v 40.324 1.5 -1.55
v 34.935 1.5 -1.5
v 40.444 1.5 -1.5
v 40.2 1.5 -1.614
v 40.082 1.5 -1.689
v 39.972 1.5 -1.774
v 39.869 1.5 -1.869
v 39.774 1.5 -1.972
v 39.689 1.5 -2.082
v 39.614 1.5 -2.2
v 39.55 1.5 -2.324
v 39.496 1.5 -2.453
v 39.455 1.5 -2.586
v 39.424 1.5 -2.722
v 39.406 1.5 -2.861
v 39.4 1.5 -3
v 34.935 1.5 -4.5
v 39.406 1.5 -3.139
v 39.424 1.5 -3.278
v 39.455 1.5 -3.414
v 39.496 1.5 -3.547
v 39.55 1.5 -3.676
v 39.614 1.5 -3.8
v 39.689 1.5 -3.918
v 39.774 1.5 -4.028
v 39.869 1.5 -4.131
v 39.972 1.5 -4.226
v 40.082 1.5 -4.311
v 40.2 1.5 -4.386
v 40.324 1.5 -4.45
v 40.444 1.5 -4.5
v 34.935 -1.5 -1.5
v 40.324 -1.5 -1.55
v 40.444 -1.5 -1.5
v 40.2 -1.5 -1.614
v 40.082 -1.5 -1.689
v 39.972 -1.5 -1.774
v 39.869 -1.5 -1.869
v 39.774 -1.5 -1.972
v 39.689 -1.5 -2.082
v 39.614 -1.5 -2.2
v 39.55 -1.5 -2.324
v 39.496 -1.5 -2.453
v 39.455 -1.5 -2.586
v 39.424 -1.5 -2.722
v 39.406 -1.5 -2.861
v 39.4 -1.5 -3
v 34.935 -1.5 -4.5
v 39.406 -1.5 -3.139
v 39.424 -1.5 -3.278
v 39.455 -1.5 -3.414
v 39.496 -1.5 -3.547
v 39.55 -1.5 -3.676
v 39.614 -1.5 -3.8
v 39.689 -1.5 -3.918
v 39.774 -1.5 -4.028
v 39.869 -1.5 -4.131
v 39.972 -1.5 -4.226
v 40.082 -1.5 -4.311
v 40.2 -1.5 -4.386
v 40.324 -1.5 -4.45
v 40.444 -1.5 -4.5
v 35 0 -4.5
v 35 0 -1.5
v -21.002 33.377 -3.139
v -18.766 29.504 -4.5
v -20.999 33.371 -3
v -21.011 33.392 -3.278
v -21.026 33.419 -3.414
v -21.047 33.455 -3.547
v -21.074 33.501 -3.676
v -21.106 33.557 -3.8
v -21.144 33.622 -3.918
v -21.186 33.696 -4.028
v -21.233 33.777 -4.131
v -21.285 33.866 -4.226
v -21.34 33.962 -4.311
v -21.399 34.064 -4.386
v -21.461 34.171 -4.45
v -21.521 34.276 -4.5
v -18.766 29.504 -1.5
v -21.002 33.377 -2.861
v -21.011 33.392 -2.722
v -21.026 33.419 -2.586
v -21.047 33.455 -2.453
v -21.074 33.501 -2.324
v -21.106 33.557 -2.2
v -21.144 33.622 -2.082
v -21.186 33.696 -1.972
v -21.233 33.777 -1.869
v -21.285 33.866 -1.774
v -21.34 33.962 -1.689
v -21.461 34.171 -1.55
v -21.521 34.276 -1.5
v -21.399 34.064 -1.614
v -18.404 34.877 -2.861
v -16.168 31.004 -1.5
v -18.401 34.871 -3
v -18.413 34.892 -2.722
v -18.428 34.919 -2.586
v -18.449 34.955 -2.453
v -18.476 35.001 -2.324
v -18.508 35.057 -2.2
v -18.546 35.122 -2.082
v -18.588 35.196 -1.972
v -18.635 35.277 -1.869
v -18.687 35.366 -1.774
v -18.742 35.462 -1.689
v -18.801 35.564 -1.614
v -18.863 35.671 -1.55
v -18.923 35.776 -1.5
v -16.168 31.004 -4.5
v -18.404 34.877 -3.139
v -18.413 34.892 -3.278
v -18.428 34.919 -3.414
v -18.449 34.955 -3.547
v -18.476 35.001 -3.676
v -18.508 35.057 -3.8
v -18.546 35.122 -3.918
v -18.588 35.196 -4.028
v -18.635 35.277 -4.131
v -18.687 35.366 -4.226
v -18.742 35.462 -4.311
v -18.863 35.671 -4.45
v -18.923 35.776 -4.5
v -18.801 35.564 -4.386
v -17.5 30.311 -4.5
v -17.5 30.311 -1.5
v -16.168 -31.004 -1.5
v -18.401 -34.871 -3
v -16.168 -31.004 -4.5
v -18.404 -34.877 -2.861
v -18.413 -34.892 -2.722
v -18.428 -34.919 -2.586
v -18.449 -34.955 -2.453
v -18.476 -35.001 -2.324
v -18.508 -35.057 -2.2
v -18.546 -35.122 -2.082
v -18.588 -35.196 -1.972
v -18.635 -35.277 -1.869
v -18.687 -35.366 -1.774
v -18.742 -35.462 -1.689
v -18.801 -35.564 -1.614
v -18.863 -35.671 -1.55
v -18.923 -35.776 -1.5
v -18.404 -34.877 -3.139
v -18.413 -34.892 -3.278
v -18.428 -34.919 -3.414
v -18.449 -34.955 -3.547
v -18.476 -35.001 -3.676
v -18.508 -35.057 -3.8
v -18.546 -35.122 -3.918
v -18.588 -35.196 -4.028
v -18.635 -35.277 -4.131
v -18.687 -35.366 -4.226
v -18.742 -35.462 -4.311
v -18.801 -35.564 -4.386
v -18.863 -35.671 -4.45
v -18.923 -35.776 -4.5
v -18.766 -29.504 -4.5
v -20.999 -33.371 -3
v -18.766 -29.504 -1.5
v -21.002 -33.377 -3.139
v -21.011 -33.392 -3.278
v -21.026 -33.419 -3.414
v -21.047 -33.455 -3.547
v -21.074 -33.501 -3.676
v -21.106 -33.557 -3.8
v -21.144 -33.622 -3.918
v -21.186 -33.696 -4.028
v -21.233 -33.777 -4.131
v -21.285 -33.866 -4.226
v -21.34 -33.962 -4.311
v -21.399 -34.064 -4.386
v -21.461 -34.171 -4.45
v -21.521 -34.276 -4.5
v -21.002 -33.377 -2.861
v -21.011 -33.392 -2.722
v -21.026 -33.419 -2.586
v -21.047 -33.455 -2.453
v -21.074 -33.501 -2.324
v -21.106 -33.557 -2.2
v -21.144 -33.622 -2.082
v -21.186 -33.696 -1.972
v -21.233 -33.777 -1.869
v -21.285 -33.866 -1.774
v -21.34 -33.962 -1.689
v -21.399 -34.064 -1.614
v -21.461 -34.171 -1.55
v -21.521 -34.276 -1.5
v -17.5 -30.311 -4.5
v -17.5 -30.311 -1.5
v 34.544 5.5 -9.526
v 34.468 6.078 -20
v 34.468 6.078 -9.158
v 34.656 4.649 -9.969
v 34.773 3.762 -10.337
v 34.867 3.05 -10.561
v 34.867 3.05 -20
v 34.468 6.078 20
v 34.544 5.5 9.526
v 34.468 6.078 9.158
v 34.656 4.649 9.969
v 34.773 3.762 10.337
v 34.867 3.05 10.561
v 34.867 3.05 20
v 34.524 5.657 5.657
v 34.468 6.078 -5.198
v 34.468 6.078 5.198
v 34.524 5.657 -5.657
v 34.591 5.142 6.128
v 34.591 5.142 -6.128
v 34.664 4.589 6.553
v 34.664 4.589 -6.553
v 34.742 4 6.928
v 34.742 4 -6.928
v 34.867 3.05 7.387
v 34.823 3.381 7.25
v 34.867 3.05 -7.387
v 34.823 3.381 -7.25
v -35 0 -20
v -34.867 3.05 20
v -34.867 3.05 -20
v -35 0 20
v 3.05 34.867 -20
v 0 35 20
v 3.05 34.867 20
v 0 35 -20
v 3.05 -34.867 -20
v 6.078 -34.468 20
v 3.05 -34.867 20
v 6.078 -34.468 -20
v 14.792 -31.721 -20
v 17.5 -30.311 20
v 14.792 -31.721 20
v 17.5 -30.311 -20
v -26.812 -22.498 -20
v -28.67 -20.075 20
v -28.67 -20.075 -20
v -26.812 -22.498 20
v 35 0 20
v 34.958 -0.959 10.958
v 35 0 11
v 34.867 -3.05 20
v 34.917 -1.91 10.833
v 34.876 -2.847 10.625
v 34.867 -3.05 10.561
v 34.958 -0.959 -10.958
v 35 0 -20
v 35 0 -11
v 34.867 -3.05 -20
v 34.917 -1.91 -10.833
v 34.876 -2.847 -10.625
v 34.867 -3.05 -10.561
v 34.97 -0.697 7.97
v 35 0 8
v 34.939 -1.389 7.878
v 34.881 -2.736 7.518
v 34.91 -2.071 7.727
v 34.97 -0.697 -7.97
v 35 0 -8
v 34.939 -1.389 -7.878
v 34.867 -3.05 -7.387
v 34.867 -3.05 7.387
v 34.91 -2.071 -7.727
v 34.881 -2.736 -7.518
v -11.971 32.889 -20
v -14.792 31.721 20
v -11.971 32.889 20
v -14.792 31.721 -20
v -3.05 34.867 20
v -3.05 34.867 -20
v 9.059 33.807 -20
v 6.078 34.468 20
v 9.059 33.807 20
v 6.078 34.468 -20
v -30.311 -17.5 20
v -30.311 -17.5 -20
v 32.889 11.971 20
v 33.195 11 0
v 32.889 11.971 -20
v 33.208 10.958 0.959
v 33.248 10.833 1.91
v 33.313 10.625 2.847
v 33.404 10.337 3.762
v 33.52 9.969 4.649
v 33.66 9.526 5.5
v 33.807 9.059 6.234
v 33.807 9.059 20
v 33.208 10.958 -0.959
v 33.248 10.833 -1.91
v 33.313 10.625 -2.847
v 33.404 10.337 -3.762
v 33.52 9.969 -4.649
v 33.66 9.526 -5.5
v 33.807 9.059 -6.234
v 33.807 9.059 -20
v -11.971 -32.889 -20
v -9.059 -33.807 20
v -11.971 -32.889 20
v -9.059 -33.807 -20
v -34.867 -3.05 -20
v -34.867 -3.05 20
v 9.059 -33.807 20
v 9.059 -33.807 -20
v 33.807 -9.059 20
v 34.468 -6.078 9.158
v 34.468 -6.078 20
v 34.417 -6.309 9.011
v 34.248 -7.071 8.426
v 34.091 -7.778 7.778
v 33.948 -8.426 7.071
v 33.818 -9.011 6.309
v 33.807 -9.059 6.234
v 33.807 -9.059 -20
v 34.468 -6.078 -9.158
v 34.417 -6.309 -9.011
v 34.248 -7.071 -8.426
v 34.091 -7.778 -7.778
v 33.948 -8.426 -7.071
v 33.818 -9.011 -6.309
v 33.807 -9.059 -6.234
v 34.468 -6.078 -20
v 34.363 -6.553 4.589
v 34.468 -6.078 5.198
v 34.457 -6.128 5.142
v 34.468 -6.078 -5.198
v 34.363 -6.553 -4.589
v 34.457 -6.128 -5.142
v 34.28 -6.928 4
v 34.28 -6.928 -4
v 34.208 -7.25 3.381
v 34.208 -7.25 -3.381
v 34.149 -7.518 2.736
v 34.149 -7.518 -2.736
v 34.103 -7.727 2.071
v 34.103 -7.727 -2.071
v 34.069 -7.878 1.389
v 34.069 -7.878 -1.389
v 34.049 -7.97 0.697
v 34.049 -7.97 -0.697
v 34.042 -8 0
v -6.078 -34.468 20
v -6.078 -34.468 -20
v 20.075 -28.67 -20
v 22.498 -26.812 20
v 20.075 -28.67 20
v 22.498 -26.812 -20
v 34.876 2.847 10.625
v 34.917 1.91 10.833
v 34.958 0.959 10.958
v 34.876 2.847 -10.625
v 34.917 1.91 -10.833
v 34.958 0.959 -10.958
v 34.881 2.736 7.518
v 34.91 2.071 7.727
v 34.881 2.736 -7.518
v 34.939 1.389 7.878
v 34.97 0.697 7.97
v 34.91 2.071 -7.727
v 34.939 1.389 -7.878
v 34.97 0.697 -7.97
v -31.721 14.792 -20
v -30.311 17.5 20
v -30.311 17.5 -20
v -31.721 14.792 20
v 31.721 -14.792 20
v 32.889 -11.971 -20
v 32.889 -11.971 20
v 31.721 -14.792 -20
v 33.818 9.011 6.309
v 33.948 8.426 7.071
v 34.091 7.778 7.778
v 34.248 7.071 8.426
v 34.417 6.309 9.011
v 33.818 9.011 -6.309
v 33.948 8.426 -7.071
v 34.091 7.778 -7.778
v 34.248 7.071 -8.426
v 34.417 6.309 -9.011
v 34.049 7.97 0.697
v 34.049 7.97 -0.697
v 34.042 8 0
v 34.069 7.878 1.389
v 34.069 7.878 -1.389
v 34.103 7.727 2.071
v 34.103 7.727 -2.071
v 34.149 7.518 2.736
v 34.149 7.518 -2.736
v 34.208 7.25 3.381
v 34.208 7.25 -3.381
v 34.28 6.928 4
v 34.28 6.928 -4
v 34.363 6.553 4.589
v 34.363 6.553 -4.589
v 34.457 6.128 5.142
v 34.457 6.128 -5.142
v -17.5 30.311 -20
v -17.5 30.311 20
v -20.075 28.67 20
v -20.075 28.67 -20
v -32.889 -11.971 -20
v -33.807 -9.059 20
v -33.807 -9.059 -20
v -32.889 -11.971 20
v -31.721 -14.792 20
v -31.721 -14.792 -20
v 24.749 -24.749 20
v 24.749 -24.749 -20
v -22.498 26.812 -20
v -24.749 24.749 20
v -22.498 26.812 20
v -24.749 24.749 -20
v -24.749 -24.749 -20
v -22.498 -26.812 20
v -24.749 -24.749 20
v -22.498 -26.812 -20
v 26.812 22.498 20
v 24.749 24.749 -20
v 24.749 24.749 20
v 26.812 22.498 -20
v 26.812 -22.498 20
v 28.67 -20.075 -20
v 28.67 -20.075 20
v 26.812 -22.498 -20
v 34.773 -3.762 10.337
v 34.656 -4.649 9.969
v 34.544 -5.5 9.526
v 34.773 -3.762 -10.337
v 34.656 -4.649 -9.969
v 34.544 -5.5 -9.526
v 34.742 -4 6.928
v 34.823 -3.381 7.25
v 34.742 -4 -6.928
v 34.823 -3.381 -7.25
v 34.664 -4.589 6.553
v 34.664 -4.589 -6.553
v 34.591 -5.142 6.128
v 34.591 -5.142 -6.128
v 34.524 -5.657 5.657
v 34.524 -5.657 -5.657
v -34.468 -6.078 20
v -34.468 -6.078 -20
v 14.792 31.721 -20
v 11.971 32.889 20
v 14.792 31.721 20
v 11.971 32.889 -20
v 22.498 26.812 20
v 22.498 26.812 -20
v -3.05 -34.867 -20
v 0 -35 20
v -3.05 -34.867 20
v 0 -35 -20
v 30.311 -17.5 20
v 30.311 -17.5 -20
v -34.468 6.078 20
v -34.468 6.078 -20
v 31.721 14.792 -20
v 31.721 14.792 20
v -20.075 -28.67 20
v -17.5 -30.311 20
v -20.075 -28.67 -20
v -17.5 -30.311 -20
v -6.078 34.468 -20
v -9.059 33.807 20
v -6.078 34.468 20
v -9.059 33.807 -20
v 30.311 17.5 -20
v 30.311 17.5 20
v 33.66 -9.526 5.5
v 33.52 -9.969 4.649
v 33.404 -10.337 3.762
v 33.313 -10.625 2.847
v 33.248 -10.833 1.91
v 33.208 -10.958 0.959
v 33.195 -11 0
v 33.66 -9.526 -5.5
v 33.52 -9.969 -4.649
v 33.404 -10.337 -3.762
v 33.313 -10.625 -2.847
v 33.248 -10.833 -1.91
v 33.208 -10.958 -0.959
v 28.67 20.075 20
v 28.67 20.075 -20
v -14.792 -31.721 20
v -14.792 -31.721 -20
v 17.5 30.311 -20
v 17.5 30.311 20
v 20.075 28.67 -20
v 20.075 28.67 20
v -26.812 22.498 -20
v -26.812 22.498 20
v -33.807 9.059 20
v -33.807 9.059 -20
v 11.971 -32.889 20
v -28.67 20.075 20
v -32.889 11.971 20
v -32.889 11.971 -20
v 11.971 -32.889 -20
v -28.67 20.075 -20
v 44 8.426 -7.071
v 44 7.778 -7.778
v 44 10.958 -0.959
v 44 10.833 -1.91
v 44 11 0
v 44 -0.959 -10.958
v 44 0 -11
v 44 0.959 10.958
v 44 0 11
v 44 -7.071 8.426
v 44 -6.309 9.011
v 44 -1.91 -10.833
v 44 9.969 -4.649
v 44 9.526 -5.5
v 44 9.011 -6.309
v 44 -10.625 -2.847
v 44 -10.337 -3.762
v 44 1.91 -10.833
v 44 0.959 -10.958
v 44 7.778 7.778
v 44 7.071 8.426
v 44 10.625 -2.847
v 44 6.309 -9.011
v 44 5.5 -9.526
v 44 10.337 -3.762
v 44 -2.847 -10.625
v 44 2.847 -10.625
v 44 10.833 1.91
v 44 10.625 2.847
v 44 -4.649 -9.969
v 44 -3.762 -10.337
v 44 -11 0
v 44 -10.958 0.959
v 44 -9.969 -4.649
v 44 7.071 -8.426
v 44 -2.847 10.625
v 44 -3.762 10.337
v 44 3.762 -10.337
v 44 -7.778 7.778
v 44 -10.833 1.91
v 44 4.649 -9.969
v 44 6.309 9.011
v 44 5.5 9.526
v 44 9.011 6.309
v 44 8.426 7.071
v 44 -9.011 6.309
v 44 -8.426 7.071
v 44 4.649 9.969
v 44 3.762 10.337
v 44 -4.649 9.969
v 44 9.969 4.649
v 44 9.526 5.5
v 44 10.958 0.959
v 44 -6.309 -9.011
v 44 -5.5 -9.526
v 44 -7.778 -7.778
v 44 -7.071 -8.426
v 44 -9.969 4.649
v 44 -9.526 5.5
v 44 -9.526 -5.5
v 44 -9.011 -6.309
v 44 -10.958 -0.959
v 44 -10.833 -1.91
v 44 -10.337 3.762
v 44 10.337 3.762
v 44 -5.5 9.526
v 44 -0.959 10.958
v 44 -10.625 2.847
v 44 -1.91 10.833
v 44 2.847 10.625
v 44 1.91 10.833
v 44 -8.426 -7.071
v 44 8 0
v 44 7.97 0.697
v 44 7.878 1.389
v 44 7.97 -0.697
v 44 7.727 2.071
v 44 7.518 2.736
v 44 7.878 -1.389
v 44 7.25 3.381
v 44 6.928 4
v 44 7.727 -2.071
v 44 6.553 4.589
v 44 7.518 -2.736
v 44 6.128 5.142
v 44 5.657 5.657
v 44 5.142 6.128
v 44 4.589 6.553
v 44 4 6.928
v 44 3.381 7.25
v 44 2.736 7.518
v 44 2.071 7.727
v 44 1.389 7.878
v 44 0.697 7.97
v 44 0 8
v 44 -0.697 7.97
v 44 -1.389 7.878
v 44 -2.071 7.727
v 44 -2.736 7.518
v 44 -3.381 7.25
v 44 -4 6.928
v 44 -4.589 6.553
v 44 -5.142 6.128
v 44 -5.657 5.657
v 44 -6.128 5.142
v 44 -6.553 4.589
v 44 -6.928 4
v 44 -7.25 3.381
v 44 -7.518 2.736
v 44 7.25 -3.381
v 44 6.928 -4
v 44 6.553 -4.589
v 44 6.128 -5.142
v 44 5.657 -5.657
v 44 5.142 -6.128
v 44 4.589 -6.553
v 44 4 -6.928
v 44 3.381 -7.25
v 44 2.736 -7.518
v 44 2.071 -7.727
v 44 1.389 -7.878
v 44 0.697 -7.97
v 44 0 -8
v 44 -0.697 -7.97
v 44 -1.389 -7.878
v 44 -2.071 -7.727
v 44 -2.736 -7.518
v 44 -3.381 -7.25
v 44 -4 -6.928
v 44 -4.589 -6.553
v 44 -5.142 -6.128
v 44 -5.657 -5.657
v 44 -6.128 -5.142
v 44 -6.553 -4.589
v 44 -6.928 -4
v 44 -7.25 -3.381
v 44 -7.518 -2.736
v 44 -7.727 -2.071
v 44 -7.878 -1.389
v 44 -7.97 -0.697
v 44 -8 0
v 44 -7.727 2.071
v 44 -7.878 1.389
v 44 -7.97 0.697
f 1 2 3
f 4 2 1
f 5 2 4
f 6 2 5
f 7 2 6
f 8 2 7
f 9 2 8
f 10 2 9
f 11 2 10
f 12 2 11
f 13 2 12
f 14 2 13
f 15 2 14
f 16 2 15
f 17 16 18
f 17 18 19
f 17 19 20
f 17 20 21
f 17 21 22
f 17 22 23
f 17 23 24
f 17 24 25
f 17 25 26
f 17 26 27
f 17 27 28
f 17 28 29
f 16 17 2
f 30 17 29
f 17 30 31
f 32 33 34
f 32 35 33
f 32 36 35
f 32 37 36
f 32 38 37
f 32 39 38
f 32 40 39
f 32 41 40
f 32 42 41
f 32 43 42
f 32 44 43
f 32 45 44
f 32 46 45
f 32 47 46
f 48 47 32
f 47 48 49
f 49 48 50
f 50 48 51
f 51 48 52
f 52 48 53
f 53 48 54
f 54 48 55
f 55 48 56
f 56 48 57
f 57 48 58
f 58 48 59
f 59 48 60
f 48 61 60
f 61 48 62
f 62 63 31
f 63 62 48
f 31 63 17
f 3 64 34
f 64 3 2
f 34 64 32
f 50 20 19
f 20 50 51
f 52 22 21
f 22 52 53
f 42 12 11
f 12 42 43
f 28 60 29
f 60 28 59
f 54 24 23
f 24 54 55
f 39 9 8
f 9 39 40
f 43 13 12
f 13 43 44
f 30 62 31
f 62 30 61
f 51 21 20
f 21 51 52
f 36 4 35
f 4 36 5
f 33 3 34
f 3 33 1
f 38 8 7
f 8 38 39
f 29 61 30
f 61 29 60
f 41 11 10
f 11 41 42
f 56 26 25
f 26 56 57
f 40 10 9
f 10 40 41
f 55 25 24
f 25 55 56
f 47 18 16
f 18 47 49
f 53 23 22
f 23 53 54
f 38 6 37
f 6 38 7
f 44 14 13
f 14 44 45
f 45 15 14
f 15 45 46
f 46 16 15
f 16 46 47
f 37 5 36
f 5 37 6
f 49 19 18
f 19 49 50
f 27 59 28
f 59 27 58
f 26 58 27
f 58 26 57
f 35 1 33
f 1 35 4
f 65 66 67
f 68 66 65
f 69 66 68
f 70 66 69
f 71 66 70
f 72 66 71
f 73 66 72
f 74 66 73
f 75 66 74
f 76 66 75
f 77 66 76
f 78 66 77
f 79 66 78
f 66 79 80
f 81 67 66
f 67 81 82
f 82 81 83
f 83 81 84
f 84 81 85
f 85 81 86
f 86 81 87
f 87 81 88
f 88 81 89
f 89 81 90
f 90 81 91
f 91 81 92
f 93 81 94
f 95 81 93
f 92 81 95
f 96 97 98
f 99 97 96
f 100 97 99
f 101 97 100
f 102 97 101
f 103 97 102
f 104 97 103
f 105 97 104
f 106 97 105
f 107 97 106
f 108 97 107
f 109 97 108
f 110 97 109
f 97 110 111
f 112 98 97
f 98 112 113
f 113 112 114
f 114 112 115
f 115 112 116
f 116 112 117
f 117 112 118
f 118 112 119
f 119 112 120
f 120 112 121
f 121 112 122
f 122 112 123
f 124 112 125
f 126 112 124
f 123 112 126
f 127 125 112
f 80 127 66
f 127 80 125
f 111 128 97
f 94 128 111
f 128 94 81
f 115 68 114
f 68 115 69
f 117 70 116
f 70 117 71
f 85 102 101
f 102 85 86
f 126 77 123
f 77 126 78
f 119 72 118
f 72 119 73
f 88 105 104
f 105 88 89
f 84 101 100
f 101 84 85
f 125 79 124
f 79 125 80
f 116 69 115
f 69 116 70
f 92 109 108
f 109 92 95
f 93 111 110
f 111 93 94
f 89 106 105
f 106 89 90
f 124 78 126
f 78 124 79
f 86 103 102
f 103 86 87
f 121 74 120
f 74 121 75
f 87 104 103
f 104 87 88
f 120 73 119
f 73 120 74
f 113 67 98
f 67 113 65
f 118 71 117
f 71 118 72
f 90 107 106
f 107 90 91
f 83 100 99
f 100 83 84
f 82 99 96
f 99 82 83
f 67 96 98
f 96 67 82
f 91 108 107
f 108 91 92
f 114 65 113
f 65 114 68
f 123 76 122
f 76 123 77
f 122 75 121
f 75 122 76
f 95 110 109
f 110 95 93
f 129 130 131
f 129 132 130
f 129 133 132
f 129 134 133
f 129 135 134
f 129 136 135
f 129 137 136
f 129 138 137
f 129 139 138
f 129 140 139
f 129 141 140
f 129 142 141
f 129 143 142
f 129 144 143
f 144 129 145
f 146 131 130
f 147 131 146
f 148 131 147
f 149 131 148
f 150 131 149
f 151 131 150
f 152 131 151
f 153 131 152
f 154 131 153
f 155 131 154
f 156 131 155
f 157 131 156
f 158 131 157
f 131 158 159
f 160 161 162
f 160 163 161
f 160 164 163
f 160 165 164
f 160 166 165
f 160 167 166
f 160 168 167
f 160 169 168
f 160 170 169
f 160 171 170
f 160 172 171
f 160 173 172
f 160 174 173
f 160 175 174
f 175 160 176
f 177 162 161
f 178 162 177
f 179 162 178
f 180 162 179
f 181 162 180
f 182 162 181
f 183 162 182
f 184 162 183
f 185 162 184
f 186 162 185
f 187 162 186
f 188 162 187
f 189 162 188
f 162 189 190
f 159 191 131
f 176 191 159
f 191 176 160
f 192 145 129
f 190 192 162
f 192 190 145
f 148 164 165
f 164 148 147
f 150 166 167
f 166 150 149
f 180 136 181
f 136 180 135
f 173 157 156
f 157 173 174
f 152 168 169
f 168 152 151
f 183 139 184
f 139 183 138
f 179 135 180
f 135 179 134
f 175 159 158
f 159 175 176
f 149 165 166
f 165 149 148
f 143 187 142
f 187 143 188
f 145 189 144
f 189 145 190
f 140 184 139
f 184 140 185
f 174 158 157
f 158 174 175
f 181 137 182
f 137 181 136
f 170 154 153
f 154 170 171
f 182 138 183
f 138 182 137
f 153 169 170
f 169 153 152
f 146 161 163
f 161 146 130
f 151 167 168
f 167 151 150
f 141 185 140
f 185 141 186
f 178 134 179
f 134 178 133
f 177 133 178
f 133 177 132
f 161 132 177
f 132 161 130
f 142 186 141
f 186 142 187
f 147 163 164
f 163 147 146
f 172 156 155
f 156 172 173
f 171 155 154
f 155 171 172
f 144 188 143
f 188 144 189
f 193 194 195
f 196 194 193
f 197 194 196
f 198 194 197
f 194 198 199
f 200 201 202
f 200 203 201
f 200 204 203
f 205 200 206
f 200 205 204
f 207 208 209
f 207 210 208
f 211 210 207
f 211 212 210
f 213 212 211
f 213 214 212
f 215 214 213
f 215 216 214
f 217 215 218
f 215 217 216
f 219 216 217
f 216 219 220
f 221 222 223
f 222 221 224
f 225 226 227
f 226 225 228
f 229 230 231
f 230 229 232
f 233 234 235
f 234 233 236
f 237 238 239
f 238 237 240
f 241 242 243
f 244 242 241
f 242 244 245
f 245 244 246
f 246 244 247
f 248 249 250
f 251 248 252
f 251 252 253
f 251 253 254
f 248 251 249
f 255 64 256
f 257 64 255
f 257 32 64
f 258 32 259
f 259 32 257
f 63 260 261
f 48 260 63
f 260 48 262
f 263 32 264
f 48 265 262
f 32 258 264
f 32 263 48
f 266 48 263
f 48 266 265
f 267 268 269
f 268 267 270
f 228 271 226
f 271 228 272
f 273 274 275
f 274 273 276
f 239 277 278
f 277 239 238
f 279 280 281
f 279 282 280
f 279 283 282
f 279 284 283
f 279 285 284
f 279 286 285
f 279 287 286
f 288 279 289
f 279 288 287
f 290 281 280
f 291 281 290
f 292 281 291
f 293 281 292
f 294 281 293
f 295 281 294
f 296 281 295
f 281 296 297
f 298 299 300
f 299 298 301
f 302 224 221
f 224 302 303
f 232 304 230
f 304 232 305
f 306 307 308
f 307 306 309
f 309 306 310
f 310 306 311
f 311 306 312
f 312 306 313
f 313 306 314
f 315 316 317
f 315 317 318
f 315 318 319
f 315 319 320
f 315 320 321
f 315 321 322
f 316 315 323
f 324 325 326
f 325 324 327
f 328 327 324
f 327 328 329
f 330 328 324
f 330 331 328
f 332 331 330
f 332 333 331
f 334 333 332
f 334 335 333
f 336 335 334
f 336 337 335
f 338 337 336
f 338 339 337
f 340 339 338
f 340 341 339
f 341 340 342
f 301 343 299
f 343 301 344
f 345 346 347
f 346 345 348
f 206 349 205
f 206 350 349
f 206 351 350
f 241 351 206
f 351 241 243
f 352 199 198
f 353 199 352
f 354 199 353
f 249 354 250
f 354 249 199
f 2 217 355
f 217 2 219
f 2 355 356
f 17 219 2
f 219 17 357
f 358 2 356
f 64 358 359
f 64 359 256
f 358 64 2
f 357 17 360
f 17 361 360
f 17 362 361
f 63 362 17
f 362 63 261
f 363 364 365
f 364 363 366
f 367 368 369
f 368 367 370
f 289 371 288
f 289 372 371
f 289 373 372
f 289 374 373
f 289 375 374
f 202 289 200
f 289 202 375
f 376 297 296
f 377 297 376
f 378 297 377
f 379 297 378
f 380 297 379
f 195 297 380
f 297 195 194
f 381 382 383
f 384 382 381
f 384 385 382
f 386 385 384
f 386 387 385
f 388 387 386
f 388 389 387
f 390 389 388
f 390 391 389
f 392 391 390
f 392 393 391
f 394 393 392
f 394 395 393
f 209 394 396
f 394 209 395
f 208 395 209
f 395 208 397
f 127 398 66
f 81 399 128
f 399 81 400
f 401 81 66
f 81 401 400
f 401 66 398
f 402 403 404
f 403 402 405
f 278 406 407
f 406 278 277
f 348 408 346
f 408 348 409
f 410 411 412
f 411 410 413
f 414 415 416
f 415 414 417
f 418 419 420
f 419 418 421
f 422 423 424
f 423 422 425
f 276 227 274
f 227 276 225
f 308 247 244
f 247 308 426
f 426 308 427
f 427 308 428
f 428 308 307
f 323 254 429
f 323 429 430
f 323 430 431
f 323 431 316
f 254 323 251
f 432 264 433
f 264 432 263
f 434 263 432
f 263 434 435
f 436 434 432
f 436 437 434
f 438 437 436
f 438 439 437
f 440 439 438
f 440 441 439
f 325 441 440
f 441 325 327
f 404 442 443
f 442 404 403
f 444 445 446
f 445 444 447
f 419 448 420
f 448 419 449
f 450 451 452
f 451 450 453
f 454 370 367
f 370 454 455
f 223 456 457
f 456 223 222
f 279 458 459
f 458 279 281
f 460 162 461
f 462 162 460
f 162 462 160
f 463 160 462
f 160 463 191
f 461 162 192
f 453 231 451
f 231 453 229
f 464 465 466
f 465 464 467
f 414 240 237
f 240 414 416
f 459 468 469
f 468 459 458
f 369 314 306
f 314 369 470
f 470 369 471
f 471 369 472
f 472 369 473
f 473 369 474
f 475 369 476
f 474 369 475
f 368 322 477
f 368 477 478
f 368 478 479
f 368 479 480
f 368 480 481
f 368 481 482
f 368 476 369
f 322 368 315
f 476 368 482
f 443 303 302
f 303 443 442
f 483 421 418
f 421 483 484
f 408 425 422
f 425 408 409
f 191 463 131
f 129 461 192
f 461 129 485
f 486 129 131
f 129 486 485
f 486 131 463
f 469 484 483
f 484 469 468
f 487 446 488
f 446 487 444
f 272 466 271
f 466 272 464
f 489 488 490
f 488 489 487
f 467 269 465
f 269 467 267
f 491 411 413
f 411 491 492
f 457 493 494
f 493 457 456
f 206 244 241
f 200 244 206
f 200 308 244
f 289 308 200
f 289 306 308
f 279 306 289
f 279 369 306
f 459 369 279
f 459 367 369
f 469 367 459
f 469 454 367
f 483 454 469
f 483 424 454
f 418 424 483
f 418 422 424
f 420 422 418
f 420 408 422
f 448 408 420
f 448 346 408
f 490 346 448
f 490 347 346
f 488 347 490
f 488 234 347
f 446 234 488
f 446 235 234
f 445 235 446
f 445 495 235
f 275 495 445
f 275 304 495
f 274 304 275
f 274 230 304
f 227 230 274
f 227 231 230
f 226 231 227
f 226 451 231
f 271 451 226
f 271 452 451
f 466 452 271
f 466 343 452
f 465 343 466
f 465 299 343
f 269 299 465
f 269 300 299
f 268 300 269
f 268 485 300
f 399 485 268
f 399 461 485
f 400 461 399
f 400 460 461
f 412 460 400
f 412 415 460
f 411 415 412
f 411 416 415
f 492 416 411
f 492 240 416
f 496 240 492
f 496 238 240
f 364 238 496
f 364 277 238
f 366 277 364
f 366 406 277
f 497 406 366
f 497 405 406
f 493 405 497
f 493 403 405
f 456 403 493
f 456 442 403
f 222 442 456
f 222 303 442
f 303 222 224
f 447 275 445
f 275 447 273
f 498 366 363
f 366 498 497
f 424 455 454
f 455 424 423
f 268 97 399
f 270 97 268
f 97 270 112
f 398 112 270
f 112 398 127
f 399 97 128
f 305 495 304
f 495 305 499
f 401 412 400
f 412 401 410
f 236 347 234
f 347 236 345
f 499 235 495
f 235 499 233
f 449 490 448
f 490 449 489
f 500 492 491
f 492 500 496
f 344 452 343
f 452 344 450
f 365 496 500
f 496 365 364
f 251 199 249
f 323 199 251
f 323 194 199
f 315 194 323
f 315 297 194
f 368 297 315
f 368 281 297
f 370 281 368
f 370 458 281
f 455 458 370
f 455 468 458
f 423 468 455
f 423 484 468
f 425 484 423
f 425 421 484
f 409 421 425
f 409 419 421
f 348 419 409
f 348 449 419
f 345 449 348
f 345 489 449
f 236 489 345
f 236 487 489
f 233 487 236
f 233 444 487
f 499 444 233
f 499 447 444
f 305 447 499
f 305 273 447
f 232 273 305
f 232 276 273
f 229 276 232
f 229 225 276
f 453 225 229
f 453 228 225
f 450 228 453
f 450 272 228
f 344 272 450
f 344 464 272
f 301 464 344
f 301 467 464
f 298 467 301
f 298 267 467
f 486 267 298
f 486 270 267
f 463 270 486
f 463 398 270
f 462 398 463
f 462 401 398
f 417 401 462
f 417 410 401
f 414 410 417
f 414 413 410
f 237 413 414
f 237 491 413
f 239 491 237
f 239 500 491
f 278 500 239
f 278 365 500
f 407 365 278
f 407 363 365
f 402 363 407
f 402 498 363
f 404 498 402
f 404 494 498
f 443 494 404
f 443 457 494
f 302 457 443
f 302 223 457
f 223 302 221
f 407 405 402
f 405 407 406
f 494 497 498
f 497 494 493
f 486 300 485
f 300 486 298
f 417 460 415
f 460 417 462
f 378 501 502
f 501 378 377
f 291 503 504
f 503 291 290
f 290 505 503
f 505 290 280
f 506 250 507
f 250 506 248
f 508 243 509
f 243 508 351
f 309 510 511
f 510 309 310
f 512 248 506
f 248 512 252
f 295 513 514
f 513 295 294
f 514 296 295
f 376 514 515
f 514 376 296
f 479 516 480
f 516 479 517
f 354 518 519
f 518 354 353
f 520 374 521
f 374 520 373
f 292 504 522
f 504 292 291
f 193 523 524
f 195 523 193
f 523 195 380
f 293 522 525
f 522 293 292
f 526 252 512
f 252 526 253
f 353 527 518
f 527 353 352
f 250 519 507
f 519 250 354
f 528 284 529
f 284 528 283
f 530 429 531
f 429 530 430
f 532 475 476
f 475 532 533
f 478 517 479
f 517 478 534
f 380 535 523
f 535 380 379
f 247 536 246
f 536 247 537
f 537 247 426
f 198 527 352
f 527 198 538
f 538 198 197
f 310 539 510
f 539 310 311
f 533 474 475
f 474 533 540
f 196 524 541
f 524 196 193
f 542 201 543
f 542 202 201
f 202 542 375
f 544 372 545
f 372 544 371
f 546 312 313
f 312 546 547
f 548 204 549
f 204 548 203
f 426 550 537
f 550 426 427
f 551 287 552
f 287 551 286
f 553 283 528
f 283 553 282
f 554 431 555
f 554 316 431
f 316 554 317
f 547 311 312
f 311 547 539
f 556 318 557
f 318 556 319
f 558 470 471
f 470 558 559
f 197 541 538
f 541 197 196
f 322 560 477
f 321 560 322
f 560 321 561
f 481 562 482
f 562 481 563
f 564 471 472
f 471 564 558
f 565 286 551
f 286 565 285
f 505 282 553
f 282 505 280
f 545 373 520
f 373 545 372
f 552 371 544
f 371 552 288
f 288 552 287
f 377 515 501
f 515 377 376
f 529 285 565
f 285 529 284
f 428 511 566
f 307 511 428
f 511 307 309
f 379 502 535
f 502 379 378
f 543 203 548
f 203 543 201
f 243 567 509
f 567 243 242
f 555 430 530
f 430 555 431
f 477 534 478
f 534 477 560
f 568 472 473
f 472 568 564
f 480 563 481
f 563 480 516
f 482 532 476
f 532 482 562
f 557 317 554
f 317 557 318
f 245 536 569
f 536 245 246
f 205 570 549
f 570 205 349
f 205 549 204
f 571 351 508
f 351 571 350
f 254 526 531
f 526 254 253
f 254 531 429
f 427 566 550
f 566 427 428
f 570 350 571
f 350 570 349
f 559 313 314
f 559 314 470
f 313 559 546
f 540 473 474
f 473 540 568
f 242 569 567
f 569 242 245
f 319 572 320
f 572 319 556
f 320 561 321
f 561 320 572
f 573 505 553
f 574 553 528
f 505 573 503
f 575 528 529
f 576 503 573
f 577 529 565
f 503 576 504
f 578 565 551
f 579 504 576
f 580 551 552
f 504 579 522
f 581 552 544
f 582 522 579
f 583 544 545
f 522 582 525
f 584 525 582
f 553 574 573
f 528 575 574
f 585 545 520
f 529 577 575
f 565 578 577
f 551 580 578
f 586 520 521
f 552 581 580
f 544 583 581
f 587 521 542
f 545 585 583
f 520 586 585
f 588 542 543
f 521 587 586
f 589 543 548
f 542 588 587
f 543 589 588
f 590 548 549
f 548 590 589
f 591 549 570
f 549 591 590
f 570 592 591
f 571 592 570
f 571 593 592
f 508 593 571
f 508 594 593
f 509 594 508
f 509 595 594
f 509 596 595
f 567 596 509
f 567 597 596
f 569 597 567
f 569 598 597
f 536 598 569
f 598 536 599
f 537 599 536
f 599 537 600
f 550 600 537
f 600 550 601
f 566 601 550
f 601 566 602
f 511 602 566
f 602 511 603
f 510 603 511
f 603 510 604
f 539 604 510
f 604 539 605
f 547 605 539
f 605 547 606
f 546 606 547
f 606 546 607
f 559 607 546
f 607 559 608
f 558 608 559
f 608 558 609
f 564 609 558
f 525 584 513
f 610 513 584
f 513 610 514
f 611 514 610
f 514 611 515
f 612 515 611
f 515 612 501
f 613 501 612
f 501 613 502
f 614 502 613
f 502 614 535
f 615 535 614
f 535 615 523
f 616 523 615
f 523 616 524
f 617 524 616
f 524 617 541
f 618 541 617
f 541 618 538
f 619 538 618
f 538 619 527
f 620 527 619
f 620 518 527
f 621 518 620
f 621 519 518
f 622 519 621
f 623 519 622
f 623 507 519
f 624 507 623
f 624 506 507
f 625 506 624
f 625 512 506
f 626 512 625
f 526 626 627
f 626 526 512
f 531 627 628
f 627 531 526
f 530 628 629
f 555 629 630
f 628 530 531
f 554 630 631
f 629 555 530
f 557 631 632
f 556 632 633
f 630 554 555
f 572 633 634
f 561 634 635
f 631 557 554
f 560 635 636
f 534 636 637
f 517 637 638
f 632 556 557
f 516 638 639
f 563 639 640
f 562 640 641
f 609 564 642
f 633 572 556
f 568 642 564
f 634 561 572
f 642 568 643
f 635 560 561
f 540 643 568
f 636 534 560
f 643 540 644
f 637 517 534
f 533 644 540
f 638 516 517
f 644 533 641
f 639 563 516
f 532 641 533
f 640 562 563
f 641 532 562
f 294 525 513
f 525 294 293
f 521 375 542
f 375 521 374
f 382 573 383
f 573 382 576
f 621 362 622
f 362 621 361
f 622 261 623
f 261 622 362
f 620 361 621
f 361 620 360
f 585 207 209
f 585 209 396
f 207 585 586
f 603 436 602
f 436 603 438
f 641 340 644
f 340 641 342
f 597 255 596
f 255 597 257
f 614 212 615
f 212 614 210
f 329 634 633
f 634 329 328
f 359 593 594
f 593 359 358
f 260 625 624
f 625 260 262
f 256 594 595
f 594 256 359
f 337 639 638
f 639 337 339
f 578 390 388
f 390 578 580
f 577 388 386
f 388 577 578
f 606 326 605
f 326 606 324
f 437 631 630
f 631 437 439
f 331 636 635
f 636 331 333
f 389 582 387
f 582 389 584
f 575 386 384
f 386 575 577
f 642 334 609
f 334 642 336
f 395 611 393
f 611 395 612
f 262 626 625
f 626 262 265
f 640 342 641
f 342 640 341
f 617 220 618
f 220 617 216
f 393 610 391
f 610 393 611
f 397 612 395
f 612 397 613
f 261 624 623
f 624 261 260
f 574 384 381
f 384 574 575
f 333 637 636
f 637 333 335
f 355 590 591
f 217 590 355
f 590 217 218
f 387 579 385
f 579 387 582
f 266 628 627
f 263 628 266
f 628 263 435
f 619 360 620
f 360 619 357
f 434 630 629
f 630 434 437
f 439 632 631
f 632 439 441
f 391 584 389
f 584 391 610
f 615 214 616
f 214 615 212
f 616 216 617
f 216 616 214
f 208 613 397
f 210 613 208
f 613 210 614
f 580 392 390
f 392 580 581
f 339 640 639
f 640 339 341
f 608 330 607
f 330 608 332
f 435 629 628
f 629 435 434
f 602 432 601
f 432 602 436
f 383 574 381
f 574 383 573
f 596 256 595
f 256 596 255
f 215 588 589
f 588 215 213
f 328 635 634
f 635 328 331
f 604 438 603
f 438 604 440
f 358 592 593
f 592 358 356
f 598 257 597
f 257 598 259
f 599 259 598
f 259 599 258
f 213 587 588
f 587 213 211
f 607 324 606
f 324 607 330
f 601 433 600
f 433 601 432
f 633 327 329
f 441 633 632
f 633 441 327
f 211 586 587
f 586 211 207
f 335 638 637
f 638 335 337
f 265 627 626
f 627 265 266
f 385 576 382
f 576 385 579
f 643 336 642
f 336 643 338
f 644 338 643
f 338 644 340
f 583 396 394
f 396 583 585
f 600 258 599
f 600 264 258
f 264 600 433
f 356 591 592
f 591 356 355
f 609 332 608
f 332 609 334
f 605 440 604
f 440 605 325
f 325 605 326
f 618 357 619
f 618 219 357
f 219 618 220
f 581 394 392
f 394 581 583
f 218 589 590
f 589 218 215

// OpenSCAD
// Robot-side vacuum SUCTION FAN - ALTERNATE BOM OPTIONS: envelope-class housing
// ==============================================================================
// BOM.md rows (upstream main, 2026-09-15, verbatim Notes column):
//   L25 5.1-6 kPa  "Nidec 22N704W150, 20N704S980, 20N704R980L; Roborock S8 Pro Ultra, S7 MaxV, S8 ..."
//   L26 10 kPa     "Roborock BL24131616; Nidec 22N704V160; S8 MaxV Ultra, G20S"
//   L27 36 kPa     "Roborock Saros 20"
//   L28 2-2.5 kPa  "Nidec 20N704P200, 20N704R500, 20N704R310, 20N704P160; S5-class legacy"
//   (+ L24 6 kPa flagship: Dreame MSD-C-3 / Nidec 20N709U020 - modeled separately,
//      suction-fan-module/suction-fan-module.scad, 60x60x30 seller-listing class.)
//
// WHAT THIS MODEL IS (read before quoting a number):
//   Nidec's vacuum-cleaner 20N/22N codes are CUSTOM build numbers (OEM parts
//   for Roborock/Dreame). Nidec's own searchable catalogue has NO public
//   datasheet for these suffixes - only the marketing product-family pages:
//     - "DC vacuum cleaner motor" page: class blades "phi 65~150 mm"
//       https://www.nidec.com/en/product/service/ncj/dc_vacuum_cleaner_motor/ (fetched 2026-09-15)
//     - "Vacuum Cleaner motors (small)" page: keyword "Fan / Blower", F-class
//       armature, UL/CSA/VDE - nil dimensions
//       https://www.nidec.com/en/sector/lifestyle/character/goods/vacuum_cleaner/i/ (fetched 2026-09-15)
//   A two-round catalogue search (2026-09-15, nidec.com sitemap + web) found no
//   primary dims sheet for 22N704W150 / 20N704S980 / 20N704R980L / BL24131616 /
//   20N704P200 class. Alibaba marketplace pages for the suffixes exist but
//   listed envelopes are UNVERIFIED (listing text only) - not used as geometry.
//   THIS FILE IS THEREFORE AN ENVELOPE-CLASS DRAFT: pick class= - the class
//   values are the only published, checkable figures; every other dimension is
//   a named estimate to be replaced by caliper readings (MEASURE-ME section 25,
//   Jig 26 identifies the class for you from the physical part).
//
// Topology reference (freely licensed photos, wikimedia commons, fetched 2026-09-15):
//   commons "Vacuum cleaner electric motor.jpg" (CC BY-SA 3.0) - target-style
//   twin-parallel-inlet scroll, stub shaft, cylindrical exit duct on the
//   periphery, perimeter mounting ears. THE FOLLOWING ARE NOT THE EXACT
//   DONOR PART: they are the generic topology class.
//
// License: CC BY-SA 4.0 (project convention)
// Units: mm

/* [Hidden] */
$fn = 72;
fa = 1;

/* [Class selection] */
// "legacy_od70" 2.5 kPa-era class, OD 70 wheel + exit stub       [screenshot class]
// "mid_od58"    Nidec deck published dims phi 58 x L 63.3 (side-arm) [Deck V55]
// "large_od60"  Nidec deck published dims phi 60 x L 73.3 (V65)      [Deck V65]
// (no published per-BOM-suffix dims exist as of 2026-09-15)
class = "legacy_od70"; // ["legacy_od70", "mid_od58", "large_od60"]

/* [Dimensions - EDIT TO MATCH YOUR MEASURED PART] */
// --- legacy_od70 vector, fields keyed to features (see index below) --------
// Sources: [B] primary-published (checkable against fetched doc/text),
//          [I] image-measured off the referenced photo, [E] estimate w/ reason
cl_legacy = [ // 2-2.5 kPa legacy class
    70.0,  // [0] canister OD (the twin-inlet wheel envelope)   [I]
    40.0,  // [1] axis length                                   [I]
    45.0,  // [2] inlet-apparent dia on face (~0.64xOD off the photo)  [E]
    22.0,  // [3] periphery exit-ring OD                        [I]
    16.0,  // [4] exit-ring ID                                  [E: ID/OD class 0.72]
    10.0,  // [5] exit-ring length (the "neck")                 [I]
    3.2,   // [6] perimeter ear hole dia (M3 clearance)         [E]
];
// --- mid_od58: Nidec "Blower Line-up for Vacuum Cleaner Ver.16C" (2021-05-06),
//     spec table p.5 + V55 outline p.9 (URL cited in upstream PR #64; text
//     fetched 2026-09-11 + 2026-09-15): "Side arm: phi 58 x L 63.3" [B];
//     p.9 outline labels "phi 58", "63.33", "70.5", "phi 55 (W/O snap fit)" [B].
cl_mid58 = [
    58.0,  // [0] canister OD                                   [B deck p.5/p.9]
    63.3,  // [1] axis length                                   [B deck p.5]
    45.0,  // [2] inlet-apparent dia (0.75-0.78xOD class, final E)  [E]
    22.0,  // [3] exit-ring OD                                  [E: same class as legacy]
    16.0,  // [4] exit-ring ID                                  [E]
    12.0,  // [5] exit-ring length                              [E]
    3.2,   // [6] ear hole dia                                  [E]
];
// --- large_od60: deck BL-V65 spec card p.14: "Blower size phi 60 x L 73.3
//     Weight (g) 230"; same slide labels "phi 62 MAX", "65.3", "34.9 3x";
//     550 W @ 28.8 V, 92 000 rpm (spec-card input values [B]).
cl_large60 = [
    60.0,  // [0] canister OD                                   [B deck p.14]
    73.3,  // [1] axis length                                   [B deck p.14]
    46.0,  // [2] inlet-apparent dia (0.75-0.78xOD class)        [E]
    24.0,  // [3] exit-ring OD "phi 62 MAX" as a 62 cap         [E: ring under cap]
    18.0,  // [4] exit-ring ID                                  [E]
    14.0,  // [5] exit-ring length                              [E]
    3.2,   // [6] ear hole dia                                  [E]
];
cls = class == "legacy_od70" ? cl_legacy : class == "mid_od58" ? cl_mid58 : cl_large60;

wheel_dia  = cls[0];
axis_L     = cls[1];
inlet_d    = cls[2];
exit_od    = cls[3];
exit_id    = cls[4];
exit_L    = cls[5];
ear_dia   = cls[6];

/* [Derived] */
shaft_d     = 5.0;   // stub shaft dia [E: commutator motor class norm 4-6 mm]
wall_t      = 2.0;   // shell thickness [E]
 erle_conv = 1; // (unused helper)

// shell = vertical cylinder stack: the twin-inlet axis is Z (both flats carry
// the eye, photos show the polar axis vertical in every catalogue pose)
// ALL envelope dims come straight from the cl* vectors; shape flags [E].
ax_L = cls[1];                    // canister thickness along the axis [B mid/large, I legacy]
can_r = wheel_dia / 2;

module canister()
    cylinder(d = wheel_dia, h = ax_L, center = true);   // z in +/-ax_L/2

// twin inlets: axial eyes through both flat faces [E depth: through]
module inlets()
    for (s = [-1, 1])
        translate([0, 0, s * (ax_L / 2 + 1)])
            mirror([0, 0, s > 0 ? 0 : 1])
                cylinder(d = inlet_d, h = ax_L + 2);

// periphery exit: ring on the +x side wall, horizontal axis
module exit_ring() {
    rotate([0, 90, 0])
        translate([0, 0, -1])
            difference() {
                cylinder(d = exit_od, h = exit_L + can_r);   // buried leg for union
                translate([0, 0, -2]) cylinder(d = exit_id, h = exit_L + can_r + 4);
            }
}

// perimeter mounting ears (3x at 120 deg) at mid-height [count/placement E]
module ears(tab_L = 6, tab_t = 3) {
    for (a = [0, 120, 240])
        rotate([0, 0, a])
            translate([can_r - 1, -tab_t / 2, -tab_t / 2])
                rotate([-90, 0, 0])
                    difference() {
                        cube([tab_L + 1.5, tab_t, tab_t]);
                        translate([tab_L / 2 + 4, tab_t / 2, -1])
                            cylinder(d = ear_dia, h = tab_t + 2);
                    }
}

module unit() {
    difference() {
        union() { canister(); ears(); }
        inlets();
    }
    exit_ring();
}

// ---- top-level -------------------------------------------------------------
echo(str("[s3d] class=", class, "  OD=", cls[0], "  axis(thick)I=", cls[1]));
unit();
